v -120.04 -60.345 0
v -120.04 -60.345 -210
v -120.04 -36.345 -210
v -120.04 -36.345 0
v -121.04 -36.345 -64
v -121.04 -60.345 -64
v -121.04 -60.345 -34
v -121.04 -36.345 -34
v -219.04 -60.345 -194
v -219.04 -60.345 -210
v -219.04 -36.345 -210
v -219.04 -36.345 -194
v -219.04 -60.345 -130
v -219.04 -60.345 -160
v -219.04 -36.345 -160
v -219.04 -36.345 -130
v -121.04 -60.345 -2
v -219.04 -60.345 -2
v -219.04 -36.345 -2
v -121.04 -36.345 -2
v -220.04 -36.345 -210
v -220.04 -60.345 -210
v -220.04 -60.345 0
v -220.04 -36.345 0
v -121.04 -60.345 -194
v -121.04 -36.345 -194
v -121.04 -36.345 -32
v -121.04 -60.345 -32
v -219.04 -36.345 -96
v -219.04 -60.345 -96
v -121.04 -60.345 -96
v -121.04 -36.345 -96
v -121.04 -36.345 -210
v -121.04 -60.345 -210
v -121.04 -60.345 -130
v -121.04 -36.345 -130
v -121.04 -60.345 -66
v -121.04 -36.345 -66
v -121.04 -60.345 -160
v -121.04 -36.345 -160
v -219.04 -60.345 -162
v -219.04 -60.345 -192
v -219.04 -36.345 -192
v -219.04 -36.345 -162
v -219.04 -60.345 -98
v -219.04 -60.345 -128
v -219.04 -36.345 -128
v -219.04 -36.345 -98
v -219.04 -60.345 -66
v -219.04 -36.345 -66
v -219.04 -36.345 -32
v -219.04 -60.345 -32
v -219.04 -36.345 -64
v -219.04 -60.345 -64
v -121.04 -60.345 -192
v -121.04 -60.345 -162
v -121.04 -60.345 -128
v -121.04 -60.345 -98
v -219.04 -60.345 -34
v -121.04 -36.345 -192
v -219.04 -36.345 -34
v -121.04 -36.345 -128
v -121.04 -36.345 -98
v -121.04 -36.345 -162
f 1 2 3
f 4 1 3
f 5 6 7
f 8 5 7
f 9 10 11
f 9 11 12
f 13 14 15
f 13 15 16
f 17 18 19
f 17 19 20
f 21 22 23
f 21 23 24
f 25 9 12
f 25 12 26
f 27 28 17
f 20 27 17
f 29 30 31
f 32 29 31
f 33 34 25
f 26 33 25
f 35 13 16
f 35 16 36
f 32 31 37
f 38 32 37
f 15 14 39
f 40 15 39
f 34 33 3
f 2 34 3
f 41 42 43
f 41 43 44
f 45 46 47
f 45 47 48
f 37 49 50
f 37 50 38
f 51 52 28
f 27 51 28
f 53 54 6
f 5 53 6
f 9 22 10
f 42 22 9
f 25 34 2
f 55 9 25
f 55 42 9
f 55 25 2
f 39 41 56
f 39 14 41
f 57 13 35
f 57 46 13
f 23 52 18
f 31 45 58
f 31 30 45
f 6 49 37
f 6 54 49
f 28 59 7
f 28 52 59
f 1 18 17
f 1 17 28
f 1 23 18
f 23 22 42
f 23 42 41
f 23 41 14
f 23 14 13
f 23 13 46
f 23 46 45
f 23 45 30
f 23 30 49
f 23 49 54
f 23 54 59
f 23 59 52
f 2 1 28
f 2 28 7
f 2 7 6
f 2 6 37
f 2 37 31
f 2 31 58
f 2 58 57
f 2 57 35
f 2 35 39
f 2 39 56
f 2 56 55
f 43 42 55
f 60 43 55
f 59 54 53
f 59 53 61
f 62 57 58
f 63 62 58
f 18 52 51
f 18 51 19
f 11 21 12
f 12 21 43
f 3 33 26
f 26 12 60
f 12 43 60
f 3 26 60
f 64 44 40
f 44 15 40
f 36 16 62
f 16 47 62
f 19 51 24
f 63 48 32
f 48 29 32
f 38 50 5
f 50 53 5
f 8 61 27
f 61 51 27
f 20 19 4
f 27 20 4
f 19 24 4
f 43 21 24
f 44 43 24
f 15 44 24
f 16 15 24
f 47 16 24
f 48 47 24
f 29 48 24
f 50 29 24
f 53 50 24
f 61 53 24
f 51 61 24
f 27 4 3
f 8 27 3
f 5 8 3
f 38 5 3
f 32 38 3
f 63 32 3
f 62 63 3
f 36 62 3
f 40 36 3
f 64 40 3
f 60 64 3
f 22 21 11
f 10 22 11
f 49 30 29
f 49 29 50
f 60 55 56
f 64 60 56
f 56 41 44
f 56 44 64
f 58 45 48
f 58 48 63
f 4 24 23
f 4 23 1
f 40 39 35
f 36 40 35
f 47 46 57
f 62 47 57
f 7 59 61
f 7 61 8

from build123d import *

# Parameters (mm, degrees)
F0_W     = 100
F0_H     = 24
F1_DEPTH = 210
F2_W     = 98
F2_H     = 30
F2_H_2   = 16
F3_DEPTH = 26


with BuildPart() as f1:
    # F0 (on Top) → F1 (new body)
    with BuildSketch(Plane.XY):
        with Locations((-170.040163, -48.344506)):
            Rectangle(F0_W, F0_H)
    extrude(amount=-F1_DEPTH)

    # F2 (on face) → F3 (cut)
    with BuildSketch(Plane.XZ.offset(60.344506)):
        with Locations((-170.040163, -17)):
            Rectangle(F2_W, F2_H)
        with Locations((-170.040163, -49)):
            Rectangle(F2_W, F2_H)
        with Locations((-170.040163, -81)):
            Rectangle(F2_W, F2_H)
        with Locations((-170.040163, -113)):
            Rectangle(F2_W, F2_H)
        with Locations((-170.040163, -145)):
            Rectangle(F2_W, F2_H)
        with Locations((-170.040163, -177)):
            Rectangle(F2_W, F2_H)
        with Locations((-170.040163, -202)):
            Rectangle(F2_W, F2_H_2)
    extrude(amount=-F3_DEPTH, mode=Mode.SUBTRACT)


solid = f1.part
